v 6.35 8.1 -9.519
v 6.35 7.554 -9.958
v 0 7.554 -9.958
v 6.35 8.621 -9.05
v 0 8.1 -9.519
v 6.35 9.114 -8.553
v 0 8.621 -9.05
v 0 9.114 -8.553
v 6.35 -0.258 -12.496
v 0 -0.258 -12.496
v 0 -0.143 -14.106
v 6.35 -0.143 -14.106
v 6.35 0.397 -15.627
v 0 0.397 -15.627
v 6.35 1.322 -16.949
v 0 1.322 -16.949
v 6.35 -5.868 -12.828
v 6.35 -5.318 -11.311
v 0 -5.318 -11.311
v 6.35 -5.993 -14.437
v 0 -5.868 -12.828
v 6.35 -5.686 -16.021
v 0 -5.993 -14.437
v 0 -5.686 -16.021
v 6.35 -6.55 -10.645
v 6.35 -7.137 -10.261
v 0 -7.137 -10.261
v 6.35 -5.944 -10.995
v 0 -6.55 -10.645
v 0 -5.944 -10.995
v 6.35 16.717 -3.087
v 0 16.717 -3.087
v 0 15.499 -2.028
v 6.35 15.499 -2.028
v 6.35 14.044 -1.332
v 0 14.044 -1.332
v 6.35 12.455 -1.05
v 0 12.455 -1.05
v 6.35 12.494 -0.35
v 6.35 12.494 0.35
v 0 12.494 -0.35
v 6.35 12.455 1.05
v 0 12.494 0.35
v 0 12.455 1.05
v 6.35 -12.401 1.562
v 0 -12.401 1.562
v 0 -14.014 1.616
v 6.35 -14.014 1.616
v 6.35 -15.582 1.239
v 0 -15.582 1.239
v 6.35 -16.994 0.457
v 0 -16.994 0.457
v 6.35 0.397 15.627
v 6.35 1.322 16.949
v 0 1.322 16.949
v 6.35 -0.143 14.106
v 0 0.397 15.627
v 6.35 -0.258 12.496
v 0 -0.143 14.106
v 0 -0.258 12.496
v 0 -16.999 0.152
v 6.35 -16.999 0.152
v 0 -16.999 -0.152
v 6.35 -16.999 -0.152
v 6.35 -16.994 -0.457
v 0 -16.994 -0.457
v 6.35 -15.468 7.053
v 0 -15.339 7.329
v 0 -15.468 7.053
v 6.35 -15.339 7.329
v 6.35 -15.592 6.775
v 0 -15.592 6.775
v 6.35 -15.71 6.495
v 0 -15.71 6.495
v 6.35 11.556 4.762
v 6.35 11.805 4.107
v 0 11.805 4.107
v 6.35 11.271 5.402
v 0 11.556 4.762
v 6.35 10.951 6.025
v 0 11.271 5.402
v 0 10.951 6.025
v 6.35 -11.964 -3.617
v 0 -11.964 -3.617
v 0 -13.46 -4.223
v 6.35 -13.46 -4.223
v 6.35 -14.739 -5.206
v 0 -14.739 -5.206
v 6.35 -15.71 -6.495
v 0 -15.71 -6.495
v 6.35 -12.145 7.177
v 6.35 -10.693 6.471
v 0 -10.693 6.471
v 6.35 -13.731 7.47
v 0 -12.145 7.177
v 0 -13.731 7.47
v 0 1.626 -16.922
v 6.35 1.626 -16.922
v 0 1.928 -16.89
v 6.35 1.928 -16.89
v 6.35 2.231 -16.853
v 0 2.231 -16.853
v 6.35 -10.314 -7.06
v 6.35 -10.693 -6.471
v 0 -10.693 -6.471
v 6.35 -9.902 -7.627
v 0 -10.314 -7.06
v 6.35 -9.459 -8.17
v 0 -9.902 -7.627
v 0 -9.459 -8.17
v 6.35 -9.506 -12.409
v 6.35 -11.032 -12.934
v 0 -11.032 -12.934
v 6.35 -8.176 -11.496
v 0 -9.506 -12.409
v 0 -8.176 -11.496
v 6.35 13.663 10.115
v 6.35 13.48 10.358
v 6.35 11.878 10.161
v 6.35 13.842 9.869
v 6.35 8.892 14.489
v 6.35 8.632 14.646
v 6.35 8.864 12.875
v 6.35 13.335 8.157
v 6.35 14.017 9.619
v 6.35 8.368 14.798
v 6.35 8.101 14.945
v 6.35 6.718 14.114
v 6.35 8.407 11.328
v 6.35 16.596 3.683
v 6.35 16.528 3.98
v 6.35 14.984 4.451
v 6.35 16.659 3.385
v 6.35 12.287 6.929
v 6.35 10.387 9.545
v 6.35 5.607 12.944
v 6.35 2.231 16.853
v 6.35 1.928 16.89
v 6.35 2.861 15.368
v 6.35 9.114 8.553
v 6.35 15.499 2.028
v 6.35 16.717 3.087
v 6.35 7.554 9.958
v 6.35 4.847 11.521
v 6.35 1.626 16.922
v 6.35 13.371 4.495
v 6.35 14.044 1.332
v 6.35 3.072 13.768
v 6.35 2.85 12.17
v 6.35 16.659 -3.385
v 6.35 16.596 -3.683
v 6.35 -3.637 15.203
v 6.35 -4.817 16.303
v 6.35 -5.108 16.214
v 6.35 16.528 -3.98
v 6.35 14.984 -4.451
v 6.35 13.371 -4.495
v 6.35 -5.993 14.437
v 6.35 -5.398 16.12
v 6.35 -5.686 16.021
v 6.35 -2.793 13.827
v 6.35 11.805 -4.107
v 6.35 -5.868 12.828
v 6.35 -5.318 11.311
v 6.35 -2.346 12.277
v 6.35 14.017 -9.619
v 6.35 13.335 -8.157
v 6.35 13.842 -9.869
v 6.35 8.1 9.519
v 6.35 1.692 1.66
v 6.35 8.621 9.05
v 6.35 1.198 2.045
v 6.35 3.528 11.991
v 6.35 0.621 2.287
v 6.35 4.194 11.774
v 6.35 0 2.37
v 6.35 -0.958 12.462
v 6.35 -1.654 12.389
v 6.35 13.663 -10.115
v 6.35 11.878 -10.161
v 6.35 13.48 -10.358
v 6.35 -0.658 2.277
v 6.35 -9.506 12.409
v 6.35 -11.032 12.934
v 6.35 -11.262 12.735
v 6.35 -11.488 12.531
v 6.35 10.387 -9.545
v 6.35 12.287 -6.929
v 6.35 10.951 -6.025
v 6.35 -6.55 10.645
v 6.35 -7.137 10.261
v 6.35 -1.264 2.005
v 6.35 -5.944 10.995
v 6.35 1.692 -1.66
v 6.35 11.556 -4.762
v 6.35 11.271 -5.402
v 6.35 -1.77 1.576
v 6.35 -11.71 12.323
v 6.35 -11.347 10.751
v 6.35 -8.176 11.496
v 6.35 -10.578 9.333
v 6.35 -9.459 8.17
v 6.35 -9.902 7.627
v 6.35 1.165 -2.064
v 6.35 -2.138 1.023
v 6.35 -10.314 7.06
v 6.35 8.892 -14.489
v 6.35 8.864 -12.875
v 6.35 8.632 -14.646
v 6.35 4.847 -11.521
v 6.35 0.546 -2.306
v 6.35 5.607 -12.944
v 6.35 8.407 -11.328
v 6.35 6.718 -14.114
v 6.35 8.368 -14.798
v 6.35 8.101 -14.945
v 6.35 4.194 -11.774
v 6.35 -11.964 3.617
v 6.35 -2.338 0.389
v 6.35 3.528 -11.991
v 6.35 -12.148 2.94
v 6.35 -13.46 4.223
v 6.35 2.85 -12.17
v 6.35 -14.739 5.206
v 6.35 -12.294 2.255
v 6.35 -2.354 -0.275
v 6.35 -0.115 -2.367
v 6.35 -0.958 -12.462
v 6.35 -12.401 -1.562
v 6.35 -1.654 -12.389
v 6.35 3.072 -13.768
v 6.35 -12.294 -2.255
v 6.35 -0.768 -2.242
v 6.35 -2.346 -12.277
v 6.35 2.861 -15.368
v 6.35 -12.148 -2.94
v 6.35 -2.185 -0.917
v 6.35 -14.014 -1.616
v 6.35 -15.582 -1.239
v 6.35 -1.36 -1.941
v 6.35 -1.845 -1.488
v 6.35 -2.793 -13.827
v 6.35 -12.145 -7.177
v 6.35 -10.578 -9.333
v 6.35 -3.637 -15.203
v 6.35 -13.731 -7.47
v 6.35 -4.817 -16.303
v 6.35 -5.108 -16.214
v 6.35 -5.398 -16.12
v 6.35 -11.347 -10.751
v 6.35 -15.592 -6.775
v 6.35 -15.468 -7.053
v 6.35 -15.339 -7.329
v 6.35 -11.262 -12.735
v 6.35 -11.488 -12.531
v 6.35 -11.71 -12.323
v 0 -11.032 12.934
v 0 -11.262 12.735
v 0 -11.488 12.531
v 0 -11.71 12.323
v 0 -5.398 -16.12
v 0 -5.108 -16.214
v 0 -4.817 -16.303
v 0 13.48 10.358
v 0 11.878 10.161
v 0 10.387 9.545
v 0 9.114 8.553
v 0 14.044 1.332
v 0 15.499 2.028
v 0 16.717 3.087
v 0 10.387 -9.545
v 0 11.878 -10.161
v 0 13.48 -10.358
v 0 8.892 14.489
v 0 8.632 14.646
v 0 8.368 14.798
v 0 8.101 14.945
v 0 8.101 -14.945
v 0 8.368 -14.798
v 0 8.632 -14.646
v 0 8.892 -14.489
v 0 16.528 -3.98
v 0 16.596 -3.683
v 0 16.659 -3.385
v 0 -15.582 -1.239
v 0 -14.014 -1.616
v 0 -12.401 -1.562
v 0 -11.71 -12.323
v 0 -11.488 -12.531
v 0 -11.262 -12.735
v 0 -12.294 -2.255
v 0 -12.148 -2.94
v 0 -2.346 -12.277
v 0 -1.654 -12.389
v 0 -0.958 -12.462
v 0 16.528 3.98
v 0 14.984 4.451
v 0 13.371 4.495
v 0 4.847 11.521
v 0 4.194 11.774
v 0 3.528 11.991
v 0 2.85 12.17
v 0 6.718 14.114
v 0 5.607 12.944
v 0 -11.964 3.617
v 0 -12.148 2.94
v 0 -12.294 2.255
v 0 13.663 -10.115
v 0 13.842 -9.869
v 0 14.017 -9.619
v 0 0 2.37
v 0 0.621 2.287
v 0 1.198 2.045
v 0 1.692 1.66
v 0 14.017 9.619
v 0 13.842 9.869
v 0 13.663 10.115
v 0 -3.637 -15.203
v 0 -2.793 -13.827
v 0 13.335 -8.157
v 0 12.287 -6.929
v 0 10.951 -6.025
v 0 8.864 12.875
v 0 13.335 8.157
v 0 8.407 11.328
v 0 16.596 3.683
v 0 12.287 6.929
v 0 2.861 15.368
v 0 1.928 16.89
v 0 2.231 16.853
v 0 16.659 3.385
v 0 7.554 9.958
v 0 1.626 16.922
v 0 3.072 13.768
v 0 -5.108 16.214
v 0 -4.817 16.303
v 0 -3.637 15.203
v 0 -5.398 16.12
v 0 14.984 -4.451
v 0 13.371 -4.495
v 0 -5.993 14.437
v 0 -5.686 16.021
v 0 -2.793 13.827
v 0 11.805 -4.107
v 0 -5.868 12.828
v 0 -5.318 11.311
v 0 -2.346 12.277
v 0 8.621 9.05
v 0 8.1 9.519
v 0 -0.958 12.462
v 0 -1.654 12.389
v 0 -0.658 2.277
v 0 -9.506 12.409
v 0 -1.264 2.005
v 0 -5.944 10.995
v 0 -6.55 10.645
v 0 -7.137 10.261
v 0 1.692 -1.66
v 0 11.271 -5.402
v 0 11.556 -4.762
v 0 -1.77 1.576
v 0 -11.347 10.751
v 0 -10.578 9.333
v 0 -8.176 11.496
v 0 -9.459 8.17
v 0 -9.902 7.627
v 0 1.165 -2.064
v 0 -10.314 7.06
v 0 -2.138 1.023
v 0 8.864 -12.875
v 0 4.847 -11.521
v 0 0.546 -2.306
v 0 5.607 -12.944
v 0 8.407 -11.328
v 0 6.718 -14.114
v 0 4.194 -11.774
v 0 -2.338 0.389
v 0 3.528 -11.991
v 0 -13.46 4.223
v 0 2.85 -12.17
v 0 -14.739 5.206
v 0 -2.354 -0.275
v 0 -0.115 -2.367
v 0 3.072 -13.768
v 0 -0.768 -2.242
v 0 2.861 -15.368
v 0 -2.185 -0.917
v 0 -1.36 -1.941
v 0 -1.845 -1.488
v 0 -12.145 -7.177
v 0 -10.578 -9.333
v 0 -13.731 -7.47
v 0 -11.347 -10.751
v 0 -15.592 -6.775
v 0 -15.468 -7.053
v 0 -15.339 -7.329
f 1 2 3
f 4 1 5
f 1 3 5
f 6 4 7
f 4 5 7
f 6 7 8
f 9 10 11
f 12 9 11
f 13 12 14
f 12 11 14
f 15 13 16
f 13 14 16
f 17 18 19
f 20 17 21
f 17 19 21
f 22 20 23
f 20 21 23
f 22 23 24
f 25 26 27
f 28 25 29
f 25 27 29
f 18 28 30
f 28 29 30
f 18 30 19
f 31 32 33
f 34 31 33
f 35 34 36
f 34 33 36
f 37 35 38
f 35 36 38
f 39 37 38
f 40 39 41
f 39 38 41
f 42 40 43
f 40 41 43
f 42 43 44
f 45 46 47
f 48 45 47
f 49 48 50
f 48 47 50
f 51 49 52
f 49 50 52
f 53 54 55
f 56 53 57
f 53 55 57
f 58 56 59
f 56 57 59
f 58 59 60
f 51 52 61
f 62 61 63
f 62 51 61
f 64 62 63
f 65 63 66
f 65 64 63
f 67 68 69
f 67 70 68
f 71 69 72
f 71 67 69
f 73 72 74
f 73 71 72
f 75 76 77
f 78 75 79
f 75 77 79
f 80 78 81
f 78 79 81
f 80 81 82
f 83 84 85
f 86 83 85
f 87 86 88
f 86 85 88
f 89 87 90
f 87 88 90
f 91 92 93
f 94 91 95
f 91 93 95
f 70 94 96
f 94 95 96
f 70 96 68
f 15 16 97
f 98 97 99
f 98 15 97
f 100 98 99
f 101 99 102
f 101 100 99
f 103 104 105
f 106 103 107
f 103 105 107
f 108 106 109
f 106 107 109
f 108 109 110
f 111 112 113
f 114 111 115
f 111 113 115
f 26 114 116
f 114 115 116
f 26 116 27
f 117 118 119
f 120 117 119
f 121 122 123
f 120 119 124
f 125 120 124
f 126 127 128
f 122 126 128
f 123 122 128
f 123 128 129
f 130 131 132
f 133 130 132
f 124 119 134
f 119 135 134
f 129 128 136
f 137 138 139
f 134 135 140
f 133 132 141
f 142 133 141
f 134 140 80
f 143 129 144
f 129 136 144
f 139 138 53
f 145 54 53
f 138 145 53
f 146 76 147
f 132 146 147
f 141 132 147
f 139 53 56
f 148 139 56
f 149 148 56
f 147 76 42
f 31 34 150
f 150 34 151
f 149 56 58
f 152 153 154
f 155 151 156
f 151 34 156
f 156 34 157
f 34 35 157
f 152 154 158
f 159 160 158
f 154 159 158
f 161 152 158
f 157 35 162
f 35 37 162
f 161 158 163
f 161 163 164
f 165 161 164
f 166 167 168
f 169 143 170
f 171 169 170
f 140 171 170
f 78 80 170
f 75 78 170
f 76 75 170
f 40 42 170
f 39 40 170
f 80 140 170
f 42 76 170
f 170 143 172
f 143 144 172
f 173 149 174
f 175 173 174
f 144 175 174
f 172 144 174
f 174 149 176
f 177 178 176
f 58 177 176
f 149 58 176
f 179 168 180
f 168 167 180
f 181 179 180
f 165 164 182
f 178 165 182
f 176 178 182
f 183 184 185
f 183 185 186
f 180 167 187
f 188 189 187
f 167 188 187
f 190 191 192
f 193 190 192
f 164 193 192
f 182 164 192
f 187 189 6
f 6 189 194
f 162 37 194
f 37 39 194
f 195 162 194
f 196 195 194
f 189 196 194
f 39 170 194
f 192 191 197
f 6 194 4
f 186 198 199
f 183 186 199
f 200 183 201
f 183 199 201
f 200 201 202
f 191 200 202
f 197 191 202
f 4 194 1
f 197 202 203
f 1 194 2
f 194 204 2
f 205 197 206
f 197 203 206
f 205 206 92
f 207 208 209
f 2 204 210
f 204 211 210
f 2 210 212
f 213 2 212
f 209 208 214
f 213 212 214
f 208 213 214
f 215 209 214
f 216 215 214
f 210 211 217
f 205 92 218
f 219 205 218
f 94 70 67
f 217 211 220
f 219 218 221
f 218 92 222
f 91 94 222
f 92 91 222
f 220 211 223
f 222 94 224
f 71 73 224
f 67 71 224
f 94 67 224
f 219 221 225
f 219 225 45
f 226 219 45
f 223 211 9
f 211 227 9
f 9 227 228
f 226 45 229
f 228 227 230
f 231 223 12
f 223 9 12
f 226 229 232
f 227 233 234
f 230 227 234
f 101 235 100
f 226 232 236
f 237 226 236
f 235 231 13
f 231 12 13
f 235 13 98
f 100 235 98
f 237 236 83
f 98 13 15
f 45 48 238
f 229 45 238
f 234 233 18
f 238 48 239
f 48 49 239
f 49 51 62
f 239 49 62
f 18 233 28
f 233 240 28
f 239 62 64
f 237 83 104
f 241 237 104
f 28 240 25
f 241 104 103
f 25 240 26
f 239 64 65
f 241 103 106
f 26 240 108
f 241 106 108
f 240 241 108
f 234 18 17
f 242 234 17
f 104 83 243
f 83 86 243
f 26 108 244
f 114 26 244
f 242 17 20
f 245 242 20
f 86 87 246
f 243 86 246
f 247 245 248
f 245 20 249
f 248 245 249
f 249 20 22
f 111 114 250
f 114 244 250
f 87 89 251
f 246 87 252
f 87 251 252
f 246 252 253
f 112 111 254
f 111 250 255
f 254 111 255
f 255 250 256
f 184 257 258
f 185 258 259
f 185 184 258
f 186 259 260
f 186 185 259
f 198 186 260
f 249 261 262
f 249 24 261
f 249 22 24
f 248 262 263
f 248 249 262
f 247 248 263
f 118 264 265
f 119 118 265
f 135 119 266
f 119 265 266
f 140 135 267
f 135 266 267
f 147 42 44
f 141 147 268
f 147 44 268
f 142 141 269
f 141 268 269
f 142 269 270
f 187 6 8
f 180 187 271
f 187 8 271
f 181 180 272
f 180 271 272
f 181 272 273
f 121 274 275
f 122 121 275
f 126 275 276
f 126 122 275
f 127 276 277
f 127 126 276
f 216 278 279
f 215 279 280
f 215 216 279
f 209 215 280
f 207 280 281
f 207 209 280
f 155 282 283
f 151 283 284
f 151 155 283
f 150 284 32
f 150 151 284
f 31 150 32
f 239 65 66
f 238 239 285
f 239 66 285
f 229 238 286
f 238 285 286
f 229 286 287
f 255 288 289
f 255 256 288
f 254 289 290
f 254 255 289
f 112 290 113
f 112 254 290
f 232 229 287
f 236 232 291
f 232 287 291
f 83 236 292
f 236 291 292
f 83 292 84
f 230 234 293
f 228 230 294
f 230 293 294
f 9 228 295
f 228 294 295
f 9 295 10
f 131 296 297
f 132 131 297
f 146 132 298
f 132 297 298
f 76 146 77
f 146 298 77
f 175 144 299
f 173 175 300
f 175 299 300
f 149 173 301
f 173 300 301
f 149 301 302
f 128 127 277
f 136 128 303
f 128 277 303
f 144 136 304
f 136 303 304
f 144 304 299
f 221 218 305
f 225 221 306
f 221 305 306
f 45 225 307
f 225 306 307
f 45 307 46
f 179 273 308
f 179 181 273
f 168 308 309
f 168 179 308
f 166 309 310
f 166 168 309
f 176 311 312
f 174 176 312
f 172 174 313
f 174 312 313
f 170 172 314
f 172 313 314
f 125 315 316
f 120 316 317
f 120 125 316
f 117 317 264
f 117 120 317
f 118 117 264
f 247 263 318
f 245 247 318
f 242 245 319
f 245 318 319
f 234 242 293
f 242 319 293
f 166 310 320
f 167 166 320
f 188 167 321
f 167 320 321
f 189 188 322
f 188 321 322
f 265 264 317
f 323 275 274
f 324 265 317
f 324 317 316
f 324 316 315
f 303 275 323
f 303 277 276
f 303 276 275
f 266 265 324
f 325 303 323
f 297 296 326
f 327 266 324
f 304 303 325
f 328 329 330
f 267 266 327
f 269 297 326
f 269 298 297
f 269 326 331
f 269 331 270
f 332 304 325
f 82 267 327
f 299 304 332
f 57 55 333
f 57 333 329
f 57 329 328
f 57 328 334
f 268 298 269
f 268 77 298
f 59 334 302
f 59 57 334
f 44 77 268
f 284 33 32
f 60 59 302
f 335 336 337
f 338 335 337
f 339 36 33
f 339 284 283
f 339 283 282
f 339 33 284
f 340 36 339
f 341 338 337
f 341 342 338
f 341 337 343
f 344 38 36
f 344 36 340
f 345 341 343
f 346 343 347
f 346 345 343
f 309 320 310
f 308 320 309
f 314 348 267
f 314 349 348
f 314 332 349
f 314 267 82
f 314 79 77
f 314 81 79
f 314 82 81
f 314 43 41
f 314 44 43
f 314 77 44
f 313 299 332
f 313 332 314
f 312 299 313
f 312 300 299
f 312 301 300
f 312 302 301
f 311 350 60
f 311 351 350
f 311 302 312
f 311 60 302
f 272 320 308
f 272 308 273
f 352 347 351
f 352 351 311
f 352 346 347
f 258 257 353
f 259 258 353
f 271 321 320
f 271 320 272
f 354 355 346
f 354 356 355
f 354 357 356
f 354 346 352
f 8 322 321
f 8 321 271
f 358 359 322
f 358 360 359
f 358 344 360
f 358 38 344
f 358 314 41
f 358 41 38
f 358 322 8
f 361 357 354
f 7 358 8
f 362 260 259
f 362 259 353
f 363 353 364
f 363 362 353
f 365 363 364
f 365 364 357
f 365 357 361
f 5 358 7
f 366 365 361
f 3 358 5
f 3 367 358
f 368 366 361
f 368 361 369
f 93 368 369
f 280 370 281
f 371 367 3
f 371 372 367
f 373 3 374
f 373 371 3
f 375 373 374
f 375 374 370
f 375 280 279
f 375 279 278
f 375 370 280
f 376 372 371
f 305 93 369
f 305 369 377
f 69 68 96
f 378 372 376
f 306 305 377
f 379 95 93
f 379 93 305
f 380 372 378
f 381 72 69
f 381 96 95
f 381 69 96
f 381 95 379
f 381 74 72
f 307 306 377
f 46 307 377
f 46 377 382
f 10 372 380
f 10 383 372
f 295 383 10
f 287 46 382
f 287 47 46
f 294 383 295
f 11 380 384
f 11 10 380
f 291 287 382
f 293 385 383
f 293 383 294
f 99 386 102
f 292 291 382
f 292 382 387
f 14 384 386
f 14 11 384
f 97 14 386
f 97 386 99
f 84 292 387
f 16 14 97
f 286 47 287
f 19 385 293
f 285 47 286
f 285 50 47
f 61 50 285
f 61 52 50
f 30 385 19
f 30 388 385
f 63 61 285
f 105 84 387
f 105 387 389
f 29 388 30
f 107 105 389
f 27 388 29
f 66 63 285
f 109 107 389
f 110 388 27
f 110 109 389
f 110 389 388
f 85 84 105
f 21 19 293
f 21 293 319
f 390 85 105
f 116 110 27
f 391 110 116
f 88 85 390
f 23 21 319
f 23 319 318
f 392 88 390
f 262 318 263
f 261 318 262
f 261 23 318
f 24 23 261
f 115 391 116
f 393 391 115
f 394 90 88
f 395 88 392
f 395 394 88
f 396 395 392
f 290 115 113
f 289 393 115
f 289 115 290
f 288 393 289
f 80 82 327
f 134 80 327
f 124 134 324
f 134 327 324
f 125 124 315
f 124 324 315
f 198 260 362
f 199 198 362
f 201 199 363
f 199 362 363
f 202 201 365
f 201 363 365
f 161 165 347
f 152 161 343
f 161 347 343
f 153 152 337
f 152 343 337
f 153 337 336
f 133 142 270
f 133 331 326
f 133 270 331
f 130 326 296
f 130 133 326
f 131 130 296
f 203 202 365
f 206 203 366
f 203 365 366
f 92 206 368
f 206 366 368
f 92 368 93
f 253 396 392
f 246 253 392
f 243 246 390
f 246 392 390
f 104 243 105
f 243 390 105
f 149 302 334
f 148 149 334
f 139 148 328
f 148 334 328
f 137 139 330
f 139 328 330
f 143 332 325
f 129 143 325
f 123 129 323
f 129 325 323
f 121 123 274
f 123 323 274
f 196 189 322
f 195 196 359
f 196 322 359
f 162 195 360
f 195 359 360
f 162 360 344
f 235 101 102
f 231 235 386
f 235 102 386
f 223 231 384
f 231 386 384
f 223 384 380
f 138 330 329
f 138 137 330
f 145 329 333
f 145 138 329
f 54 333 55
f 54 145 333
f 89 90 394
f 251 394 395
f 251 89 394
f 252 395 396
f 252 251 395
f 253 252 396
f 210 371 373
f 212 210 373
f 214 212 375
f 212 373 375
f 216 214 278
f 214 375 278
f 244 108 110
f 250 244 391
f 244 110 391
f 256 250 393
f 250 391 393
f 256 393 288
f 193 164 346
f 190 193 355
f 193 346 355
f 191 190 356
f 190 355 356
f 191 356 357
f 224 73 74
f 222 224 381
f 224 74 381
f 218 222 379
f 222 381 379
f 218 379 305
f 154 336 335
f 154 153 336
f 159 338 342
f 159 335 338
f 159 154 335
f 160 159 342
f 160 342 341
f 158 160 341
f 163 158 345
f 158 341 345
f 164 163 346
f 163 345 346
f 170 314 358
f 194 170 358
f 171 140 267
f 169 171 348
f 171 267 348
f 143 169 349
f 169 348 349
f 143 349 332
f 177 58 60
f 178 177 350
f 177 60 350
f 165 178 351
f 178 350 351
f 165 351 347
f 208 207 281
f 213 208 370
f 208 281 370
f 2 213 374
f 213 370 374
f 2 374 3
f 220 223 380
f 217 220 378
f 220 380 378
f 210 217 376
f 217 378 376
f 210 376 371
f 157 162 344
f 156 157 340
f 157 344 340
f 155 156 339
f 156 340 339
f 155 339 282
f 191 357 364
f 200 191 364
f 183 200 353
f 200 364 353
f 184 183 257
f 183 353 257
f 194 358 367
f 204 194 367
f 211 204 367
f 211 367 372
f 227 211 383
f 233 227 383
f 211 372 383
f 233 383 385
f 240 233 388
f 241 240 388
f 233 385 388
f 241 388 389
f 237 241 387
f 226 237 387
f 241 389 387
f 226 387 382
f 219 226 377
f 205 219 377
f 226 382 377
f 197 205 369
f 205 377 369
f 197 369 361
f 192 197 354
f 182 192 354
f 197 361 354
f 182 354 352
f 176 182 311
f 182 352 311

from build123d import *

# Parameters (mm, degrees)
BASPROSKE_W        = 6.35
BASPROSKE_H        = 17
TOOTHCUT_DEPTH     = 25.86609137
TEETHCUTS_COUNT    = 15
BORSKE_R           = 0.4
BORE_DEPTH         = 50.0000508
CUT_EXTRUDE1_DEPTH = 25.830915598


with BuildPart() as part:
    # BasProSke → Base-Revolve (revolve)
    with BuildSketch(Plane(origin=(0, 0, 0), x_dir=(1, 0, 0), z_dir=(0, 1, 0)), mode=Mode.PRIVATE) as base_revolve_sk:
        with Locations((3.175, 8.5)):
            Rectangle(BASPROSKE_W, BASPROSKE_H)
    revolve(base_revolve_sk.sketch.rotate(Axis((-10, 0, 0), (1, 0, 0)), 180), axis=Axis((-10, 0, 0), (1, 0, 0)))

    # TooCutSke → ToothCut (cut, through all)
    with BuildSketch(Plane(origin=(0, 0, 0), x_dir=(0, 0, -1), z_dir=(1, 0, 0))):
        with BuildLine():
            ThreePointArc((1.050056448, 12.454813626), (0, 12.499), (-1.050056448, 12.454813626))
            ThreePointArc((-1.050056448, 12.454813626), (-1.638118106, 14.809604533), (-3.110934279, 16.73876737))
            ThreePointArc((-3.110934279, 16.73876737), (0, 17.0254), (3.110934279, 16.73876737))
            ThreePointArc((3.110934279, 16.73876737), (1.638118106, 14.809604533), (1.050056448, 12.454813626))
        make_face()
    toothcut = extrude(amount=TOOTHCUT_DEPTH, mode=Mode.SUBTRACT)

    # TeethCuts: ToothCut ×15 about axis
    teethcuts_axis = Axis((0, 0, 0), (1, 0, 0))
    for i in range(1, TEETHCUTS_COUNT):
        add(toothcut.rotate(teethcuts_axis, i * 360 / TEETHCUTS_COUNT), mode=Mode.SUBTRACT)

    # BorSke → Bore (cut, symmetric)
    with BuildSketch(Plane(origin=(0, 0, 0), x_dir=(0, 0, -1), z_dir=(1, 0, 0))):
        with Locations(Location((0, 0, 0), (0, 0, 180))):
            Circle(BORSKE_R)
    extrude(amount=BORE_DEPTH, both=True, mode=Mode.SUBTRACT)

    # Sketch1 → Cut-Extrude1 (cut, through all)
    with BuildSketch(Plane.ZY):
        with BuildLine():
            Line((1.659895813, 1.69164), (-1.659895813, 1.69164))
            ThreePointArc((-1.659895813, 1.69164), (-0.917318626, -2.185274934), (2.37, 0))
            ThreePointArc((2.37, 0), (2.185274934, 0.917318626), (1.659895813, 1.69164))
        make_face()
    extrude(amount=-CUT_EXTRUDE1_DEPTH, mode=Mode.SUBTRACT)


solid = part.part
